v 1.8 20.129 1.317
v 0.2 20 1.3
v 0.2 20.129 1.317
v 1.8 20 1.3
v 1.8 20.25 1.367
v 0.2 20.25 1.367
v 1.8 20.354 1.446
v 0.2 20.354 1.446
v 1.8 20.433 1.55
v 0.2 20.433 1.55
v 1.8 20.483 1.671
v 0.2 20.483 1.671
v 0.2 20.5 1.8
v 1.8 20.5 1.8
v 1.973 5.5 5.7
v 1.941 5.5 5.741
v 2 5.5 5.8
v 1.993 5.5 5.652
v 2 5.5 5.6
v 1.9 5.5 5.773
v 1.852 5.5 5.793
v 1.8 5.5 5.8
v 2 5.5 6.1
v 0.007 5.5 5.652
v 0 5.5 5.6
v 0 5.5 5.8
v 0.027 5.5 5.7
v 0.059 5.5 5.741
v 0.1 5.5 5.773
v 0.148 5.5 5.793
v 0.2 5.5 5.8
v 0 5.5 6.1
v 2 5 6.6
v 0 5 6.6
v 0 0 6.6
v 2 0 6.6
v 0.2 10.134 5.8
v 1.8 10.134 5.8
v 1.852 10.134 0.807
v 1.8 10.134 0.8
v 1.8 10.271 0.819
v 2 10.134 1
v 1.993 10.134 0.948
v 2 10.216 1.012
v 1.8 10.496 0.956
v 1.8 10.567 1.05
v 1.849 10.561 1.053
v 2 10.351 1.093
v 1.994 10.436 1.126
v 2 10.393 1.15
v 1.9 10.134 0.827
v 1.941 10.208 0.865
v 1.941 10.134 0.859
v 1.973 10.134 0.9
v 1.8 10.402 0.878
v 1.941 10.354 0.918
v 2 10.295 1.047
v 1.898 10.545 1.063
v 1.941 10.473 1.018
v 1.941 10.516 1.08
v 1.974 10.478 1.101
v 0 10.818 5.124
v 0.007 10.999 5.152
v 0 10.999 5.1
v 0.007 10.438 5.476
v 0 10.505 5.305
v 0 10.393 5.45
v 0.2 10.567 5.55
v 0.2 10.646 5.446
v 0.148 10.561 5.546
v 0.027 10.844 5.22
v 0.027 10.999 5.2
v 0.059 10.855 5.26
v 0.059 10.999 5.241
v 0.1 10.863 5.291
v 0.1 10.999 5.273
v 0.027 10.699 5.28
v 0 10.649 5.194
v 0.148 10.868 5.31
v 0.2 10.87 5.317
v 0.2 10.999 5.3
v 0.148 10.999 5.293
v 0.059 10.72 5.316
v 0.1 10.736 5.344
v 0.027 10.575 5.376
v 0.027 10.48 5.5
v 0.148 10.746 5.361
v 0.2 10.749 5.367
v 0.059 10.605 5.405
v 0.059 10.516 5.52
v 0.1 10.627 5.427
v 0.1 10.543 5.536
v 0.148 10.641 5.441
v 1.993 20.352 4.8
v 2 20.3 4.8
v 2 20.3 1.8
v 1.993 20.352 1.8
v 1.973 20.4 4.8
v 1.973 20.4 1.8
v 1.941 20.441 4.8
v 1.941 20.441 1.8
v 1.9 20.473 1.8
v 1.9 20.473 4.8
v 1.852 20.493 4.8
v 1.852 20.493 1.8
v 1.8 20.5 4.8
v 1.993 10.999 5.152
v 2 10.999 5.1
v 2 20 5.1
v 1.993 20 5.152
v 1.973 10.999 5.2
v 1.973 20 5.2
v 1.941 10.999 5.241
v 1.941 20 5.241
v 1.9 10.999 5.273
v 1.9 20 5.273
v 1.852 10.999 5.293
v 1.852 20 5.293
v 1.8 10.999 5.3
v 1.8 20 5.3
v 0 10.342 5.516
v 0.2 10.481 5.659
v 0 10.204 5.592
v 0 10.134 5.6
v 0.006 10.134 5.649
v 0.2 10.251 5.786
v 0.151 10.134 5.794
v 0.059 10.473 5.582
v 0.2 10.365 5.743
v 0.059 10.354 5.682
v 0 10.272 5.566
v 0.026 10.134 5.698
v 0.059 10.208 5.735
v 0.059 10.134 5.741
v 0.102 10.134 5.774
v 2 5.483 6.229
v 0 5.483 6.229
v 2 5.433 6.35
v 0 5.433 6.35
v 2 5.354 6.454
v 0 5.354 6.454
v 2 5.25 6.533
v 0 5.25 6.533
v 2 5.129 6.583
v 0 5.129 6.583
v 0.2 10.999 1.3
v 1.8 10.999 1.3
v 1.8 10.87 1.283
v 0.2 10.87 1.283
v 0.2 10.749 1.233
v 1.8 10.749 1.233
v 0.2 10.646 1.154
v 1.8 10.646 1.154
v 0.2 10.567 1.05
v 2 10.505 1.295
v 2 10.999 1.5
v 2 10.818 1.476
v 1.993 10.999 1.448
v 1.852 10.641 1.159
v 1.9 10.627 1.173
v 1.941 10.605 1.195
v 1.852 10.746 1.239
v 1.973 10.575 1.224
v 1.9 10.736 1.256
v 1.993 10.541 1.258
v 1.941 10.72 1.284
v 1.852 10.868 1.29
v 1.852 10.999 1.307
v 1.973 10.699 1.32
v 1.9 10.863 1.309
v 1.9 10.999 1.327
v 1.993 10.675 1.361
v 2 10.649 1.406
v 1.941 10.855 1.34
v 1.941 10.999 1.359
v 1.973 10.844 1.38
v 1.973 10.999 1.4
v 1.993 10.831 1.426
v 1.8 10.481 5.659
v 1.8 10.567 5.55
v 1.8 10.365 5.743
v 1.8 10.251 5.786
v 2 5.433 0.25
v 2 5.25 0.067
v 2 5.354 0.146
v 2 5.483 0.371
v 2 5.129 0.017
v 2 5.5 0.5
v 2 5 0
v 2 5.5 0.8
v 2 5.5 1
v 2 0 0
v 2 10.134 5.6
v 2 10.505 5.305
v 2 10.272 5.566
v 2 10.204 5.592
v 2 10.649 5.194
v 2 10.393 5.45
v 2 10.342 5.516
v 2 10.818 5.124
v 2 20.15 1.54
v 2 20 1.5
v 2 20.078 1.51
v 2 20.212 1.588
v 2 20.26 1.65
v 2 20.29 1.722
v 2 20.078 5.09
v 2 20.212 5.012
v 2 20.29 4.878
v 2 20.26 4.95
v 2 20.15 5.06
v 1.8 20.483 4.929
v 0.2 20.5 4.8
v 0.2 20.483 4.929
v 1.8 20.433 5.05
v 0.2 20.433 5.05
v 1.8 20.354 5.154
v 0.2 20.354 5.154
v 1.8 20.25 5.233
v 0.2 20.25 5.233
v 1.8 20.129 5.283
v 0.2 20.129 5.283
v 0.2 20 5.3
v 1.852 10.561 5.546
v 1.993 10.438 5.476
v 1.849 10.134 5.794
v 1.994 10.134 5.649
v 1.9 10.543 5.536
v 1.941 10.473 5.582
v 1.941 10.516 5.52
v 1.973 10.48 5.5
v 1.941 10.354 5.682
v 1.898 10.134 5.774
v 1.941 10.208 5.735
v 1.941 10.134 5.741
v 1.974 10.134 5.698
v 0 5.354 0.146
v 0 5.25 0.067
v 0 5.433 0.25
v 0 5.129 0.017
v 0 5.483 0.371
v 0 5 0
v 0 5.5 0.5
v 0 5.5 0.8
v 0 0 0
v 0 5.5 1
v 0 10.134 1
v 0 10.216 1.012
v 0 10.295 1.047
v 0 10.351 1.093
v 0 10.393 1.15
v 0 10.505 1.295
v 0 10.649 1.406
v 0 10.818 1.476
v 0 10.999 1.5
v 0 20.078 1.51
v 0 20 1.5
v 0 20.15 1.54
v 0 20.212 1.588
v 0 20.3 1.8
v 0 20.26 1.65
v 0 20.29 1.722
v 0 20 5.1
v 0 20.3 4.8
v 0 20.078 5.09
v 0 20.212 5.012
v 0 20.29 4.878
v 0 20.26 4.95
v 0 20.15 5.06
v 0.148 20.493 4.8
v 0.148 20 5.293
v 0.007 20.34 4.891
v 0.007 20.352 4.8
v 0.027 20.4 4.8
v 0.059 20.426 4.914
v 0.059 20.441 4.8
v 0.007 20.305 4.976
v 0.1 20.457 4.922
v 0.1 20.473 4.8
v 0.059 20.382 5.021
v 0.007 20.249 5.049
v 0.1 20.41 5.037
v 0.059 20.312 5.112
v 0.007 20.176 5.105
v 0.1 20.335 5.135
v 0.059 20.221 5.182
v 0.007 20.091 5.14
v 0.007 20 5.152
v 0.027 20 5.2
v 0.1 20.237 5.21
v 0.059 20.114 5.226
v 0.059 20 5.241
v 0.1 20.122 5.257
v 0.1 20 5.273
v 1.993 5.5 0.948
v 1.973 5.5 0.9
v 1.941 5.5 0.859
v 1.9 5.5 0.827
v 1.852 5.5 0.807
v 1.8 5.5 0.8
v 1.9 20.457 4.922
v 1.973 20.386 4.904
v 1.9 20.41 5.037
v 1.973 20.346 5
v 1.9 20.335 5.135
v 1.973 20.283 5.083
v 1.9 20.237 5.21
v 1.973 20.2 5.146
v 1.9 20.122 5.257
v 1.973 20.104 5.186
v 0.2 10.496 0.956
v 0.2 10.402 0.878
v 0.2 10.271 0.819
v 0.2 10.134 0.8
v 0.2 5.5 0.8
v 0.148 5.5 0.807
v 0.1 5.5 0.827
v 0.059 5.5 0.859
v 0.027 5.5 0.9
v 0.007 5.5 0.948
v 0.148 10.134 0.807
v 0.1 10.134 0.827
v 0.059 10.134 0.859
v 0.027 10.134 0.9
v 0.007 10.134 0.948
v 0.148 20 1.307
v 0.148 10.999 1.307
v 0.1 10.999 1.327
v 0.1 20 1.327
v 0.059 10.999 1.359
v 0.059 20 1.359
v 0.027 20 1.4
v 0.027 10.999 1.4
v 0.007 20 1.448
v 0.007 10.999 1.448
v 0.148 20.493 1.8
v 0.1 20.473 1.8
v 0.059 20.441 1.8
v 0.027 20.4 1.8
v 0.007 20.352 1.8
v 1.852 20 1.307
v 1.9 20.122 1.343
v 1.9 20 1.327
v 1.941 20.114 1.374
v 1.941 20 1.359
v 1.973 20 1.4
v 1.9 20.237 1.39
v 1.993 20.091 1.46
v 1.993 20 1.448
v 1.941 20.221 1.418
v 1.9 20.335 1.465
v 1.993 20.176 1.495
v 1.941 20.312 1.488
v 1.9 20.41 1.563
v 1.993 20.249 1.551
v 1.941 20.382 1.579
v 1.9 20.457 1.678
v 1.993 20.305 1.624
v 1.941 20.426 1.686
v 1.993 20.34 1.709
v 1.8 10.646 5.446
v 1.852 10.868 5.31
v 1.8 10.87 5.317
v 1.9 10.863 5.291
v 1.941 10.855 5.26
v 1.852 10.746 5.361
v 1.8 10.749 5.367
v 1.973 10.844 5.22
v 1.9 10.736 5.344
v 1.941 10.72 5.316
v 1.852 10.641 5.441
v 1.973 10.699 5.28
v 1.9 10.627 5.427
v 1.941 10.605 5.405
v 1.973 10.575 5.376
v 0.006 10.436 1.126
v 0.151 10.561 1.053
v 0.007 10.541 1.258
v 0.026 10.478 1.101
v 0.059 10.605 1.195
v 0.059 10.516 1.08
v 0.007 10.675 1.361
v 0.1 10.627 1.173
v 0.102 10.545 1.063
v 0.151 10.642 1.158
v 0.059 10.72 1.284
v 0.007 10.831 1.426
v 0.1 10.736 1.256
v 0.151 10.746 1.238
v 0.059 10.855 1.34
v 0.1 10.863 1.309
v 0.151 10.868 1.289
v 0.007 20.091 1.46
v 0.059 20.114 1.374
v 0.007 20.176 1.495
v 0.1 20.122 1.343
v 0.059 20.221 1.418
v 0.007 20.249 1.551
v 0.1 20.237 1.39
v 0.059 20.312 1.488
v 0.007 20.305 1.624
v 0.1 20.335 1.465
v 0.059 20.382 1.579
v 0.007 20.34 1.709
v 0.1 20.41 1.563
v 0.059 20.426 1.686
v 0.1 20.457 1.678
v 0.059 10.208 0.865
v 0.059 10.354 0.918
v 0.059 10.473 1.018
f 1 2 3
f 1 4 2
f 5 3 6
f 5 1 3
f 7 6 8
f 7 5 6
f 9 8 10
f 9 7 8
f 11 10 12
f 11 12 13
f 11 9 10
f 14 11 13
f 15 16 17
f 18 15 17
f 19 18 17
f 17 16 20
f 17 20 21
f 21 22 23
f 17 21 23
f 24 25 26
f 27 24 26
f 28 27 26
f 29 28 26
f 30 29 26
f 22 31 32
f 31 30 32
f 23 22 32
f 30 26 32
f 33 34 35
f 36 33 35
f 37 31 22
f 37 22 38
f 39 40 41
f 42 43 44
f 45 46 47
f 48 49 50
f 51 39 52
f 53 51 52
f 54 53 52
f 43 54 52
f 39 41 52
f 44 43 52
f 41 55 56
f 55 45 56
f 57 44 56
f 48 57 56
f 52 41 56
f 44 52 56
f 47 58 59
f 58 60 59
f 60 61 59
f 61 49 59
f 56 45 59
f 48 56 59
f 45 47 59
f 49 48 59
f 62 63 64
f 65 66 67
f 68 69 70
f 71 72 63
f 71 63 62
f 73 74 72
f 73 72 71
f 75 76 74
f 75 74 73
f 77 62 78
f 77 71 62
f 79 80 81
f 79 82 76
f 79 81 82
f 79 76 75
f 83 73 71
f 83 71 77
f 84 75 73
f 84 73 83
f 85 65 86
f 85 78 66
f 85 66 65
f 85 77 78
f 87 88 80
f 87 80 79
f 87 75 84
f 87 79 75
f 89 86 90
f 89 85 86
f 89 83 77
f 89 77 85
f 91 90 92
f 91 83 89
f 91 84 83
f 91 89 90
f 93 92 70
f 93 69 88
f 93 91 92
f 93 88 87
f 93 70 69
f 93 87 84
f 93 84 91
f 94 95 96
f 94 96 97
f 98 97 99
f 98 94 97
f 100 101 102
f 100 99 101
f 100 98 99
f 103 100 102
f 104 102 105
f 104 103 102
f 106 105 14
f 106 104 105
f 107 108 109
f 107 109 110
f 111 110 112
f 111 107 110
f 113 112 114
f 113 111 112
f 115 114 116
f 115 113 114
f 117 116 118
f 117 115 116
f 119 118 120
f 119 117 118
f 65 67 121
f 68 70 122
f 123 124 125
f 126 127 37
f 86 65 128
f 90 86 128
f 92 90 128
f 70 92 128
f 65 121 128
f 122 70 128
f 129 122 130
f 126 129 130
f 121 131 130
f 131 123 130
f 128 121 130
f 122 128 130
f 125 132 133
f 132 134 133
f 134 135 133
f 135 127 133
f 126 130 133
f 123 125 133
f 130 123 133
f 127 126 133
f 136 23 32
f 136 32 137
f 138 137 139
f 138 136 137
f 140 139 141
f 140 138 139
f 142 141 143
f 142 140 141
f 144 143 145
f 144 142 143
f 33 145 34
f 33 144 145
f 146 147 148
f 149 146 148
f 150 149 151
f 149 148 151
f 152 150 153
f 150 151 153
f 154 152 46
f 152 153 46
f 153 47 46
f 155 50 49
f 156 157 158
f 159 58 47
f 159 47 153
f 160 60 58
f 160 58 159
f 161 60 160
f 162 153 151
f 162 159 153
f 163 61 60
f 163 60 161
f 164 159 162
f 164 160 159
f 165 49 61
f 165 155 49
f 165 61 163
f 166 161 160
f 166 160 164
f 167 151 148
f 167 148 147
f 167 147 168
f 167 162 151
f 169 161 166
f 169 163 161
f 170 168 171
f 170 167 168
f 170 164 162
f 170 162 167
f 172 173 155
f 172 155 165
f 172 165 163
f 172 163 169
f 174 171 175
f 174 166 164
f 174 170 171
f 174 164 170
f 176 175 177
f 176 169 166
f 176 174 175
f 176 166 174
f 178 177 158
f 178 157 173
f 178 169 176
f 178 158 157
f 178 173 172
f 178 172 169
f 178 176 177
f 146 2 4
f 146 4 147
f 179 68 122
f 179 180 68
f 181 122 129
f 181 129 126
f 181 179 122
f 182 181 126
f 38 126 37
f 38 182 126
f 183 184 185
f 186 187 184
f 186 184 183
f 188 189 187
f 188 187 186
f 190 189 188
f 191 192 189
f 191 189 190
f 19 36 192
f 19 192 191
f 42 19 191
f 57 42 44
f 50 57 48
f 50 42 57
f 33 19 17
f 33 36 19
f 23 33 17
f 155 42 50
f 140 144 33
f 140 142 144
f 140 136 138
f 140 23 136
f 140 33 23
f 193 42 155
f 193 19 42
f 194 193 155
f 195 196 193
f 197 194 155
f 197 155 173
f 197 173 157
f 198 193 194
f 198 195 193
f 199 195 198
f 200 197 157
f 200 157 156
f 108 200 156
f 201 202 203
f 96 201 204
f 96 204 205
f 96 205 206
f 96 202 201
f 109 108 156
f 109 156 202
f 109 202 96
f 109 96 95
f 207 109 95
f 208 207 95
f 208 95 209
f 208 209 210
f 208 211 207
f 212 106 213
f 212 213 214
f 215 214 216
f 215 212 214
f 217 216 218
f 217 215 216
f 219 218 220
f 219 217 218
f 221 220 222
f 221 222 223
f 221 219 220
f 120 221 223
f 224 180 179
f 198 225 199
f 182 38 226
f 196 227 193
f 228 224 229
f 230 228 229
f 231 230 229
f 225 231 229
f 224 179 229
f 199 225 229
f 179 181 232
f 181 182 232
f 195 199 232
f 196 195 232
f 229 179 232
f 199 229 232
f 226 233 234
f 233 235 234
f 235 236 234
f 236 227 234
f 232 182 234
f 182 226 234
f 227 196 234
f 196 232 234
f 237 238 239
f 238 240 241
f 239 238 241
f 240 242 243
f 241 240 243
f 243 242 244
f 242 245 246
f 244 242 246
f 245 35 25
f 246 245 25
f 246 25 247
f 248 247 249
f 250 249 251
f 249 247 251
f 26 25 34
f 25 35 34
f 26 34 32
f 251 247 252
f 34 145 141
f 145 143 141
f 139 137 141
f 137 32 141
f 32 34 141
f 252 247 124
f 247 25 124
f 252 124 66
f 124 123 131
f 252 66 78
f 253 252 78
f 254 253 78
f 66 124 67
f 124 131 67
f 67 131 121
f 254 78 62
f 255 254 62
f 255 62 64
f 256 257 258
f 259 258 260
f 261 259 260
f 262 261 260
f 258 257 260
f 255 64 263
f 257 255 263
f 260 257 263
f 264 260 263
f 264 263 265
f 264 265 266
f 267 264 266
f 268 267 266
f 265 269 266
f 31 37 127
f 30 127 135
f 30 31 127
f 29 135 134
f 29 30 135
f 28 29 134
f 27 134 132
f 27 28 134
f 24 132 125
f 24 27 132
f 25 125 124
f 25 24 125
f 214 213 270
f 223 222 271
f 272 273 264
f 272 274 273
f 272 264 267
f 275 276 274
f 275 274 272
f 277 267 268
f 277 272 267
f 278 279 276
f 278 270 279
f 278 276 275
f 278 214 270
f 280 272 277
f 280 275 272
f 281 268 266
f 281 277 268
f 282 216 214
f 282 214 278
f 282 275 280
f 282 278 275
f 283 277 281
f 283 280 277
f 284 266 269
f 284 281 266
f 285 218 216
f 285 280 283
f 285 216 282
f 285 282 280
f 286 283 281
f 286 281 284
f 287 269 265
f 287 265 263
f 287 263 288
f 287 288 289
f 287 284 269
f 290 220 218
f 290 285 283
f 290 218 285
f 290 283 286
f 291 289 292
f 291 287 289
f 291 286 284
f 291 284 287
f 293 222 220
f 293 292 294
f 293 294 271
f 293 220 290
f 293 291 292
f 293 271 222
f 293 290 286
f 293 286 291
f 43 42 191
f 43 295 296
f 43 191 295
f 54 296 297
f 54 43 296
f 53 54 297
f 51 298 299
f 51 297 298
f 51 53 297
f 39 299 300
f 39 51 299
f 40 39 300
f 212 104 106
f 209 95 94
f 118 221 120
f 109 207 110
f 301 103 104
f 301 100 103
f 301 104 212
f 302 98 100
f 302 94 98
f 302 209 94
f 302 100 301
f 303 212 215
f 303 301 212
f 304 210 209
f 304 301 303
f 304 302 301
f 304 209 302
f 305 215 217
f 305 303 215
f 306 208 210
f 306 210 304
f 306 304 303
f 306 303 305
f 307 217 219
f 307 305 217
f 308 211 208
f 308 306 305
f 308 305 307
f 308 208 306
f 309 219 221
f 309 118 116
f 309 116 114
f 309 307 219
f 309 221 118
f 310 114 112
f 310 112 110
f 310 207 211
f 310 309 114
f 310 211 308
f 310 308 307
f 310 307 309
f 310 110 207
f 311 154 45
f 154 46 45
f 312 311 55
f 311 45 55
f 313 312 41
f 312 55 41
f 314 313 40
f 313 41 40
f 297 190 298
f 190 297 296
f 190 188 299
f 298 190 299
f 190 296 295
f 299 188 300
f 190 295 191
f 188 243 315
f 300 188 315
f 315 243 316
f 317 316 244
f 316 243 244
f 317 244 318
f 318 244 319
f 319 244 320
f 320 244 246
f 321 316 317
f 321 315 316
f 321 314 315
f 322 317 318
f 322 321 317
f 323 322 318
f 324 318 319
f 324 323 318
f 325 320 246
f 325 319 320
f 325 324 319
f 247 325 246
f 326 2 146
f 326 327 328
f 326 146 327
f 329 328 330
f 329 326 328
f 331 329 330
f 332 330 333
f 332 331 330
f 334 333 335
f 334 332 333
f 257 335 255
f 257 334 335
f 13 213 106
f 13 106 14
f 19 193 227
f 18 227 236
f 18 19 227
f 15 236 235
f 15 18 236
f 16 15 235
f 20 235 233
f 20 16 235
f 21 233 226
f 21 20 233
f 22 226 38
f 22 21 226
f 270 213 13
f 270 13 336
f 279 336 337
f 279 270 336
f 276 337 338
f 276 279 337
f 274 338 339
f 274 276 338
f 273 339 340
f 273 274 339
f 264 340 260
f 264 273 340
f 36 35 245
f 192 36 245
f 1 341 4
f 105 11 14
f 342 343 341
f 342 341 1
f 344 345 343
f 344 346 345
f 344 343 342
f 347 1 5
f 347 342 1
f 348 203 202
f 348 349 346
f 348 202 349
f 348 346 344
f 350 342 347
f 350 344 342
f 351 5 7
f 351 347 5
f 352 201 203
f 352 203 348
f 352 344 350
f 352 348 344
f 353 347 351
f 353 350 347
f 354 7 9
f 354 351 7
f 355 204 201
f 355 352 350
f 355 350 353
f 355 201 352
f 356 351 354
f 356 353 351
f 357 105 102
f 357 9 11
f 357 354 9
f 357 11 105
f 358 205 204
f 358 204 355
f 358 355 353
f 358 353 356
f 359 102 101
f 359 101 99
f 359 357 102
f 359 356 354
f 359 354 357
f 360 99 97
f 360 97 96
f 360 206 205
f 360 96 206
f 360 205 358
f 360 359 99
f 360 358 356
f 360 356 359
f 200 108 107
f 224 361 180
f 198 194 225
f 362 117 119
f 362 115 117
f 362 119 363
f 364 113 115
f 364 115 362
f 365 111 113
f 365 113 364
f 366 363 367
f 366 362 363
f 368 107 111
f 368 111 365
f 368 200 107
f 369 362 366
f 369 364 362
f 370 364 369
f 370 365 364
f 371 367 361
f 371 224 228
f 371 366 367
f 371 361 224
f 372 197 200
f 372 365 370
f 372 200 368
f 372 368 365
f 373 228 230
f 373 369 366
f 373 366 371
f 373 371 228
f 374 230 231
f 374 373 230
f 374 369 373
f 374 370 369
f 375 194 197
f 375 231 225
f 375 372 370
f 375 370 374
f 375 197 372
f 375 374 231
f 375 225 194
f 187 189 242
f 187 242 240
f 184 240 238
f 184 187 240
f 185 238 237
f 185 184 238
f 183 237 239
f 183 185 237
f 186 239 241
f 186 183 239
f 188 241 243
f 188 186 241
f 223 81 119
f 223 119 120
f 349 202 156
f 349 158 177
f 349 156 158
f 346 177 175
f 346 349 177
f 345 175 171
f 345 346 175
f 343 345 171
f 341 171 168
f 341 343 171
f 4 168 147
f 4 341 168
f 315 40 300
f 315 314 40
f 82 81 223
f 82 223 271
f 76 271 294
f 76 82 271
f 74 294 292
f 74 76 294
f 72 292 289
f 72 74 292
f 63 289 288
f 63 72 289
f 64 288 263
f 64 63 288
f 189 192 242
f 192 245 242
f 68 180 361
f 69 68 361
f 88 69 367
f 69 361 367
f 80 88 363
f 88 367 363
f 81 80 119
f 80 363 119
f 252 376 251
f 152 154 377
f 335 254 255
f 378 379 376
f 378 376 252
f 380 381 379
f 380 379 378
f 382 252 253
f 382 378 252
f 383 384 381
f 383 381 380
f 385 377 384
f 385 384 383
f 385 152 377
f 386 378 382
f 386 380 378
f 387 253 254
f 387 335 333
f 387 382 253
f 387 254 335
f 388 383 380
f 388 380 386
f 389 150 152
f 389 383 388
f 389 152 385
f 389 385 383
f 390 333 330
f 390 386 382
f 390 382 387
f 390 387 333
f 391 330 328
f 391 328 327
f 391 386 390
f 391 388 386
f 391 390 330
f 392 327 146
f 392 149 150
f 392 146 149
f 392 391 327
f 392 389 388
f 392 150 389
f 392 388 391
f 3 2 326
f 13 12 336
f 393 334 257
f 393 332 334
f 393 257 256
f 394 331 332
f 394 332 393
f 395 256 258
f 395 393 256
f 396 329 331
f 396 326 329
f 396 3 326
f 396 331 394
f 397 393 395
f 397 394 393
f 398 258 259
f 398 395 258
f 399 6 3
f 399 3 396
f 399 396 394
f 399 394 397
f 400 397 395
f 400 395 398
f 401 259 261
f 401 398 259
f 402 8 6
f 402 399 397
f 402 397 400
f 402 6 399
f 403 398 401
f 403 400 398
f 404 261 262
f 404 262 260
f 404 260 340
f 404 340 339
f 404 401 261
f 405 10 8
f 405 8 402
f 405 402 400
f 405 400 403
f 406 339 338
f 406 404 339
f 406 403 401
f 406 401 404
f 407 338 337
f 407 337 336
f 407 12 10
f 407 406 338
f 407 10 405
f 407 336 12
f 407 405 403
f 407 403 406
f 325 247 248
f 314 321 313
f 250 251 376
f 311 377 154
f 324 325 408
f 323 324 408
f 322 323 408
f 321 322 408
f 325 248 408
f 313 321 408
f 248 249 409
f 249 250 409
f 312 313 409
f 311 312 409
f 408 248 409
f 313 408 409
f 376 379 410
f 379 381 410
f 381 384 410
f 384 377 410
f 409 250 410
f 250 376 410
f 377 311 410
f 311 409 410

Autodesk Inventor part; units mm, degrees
ref_plane "YZ Plane" through (0, 0, 0) normal (1, 0, 0) x (0, 1, 0)
ref_plane "XZ Plane" through (0, 0, 0) normal (0, 1, 0) x (-1, 0, 0)
ref_plane "XY Plane" through (0, 0, 0) normal (0, 0, 1) x (1, 0, 0)
sketch "Sketch4" plane through (0, 0, 0) normal (1, 0, 0) x (0, 1, 0)
  line L0 (0, 0) -> (5.5, 0)
  line L1 (5.5, 0) -> (5.5, 6.6)
  line L2 (5.5, 6.6) -> (0, 6.6)
  line L3 (0, 6.6) -> (0, 0)
  line L4 (5.5, 5.8) -> (10.5, 5.8)
  line L5 (10.5, 5.8) -> (10.5, 0.8)
  line L6 (10.5, 0.8) -> (5.5, 0.8)
  line L7 (5.5, 0.8) -> (5.5, 5.8)
  line L8 (0, 3.3) -> (20.5, 3.3)
  line L9 (10.5, 5.3) -> (20.5, 5.3)
  line L10 (20.5, 5.3) -> (20.5, 1.3)
  line L11 (20.5, 1.3) -> (10.5, 1.3)
  line L12 (10.5, 1.3) -> (10.5, 5.3)
  dimension "d0" = 6.6
  dimension "d1" = 5.5
  dimension "d2" = 5
  dimension "d3" = 4
  dimension "d4" = 15
  dimension "d5" = 10
extrude "Extrusion1" add sketch "Sketch4" along normal blind 2
fillet "Fillet1" radius 0.5 8 edges at (1, 10.5, 5.3) (1, 20.5, 5.3) (1, 10.5, 5.8) (1, 20.5, 1.3) (1, 10.5, 1.3) (1, 10.5, 0.8) (1, 5.5, 0) (1, 5.5, 6.6)
fillet "Fillet2" radius 0.2 18 edges at (2, 10.3837, 5.7329) (2, 15.4995, 5.3) (2, 20.3536, 5.1536) (2, 20.5, 3.3) (2, 20.3536, 1.4464) (2, 15.4995, 1.3) (2, 10.3837, 0.8671) (2, 7.8168, 0.8) (2, 7.8168, 5.8) (0, 10.3837, 5.7329) (0, 15.4995, 5.3) (0, 20.3536, 5.1536) (0, 20.5, 3.3) (0, 20.3536, 1.4464) (0, 15.4995, 1.3) (0, 10.3837, 0.8671) (0, 7.8168, 0.8) (0, 7.8168, 5.8)
properties part number "Slider"
